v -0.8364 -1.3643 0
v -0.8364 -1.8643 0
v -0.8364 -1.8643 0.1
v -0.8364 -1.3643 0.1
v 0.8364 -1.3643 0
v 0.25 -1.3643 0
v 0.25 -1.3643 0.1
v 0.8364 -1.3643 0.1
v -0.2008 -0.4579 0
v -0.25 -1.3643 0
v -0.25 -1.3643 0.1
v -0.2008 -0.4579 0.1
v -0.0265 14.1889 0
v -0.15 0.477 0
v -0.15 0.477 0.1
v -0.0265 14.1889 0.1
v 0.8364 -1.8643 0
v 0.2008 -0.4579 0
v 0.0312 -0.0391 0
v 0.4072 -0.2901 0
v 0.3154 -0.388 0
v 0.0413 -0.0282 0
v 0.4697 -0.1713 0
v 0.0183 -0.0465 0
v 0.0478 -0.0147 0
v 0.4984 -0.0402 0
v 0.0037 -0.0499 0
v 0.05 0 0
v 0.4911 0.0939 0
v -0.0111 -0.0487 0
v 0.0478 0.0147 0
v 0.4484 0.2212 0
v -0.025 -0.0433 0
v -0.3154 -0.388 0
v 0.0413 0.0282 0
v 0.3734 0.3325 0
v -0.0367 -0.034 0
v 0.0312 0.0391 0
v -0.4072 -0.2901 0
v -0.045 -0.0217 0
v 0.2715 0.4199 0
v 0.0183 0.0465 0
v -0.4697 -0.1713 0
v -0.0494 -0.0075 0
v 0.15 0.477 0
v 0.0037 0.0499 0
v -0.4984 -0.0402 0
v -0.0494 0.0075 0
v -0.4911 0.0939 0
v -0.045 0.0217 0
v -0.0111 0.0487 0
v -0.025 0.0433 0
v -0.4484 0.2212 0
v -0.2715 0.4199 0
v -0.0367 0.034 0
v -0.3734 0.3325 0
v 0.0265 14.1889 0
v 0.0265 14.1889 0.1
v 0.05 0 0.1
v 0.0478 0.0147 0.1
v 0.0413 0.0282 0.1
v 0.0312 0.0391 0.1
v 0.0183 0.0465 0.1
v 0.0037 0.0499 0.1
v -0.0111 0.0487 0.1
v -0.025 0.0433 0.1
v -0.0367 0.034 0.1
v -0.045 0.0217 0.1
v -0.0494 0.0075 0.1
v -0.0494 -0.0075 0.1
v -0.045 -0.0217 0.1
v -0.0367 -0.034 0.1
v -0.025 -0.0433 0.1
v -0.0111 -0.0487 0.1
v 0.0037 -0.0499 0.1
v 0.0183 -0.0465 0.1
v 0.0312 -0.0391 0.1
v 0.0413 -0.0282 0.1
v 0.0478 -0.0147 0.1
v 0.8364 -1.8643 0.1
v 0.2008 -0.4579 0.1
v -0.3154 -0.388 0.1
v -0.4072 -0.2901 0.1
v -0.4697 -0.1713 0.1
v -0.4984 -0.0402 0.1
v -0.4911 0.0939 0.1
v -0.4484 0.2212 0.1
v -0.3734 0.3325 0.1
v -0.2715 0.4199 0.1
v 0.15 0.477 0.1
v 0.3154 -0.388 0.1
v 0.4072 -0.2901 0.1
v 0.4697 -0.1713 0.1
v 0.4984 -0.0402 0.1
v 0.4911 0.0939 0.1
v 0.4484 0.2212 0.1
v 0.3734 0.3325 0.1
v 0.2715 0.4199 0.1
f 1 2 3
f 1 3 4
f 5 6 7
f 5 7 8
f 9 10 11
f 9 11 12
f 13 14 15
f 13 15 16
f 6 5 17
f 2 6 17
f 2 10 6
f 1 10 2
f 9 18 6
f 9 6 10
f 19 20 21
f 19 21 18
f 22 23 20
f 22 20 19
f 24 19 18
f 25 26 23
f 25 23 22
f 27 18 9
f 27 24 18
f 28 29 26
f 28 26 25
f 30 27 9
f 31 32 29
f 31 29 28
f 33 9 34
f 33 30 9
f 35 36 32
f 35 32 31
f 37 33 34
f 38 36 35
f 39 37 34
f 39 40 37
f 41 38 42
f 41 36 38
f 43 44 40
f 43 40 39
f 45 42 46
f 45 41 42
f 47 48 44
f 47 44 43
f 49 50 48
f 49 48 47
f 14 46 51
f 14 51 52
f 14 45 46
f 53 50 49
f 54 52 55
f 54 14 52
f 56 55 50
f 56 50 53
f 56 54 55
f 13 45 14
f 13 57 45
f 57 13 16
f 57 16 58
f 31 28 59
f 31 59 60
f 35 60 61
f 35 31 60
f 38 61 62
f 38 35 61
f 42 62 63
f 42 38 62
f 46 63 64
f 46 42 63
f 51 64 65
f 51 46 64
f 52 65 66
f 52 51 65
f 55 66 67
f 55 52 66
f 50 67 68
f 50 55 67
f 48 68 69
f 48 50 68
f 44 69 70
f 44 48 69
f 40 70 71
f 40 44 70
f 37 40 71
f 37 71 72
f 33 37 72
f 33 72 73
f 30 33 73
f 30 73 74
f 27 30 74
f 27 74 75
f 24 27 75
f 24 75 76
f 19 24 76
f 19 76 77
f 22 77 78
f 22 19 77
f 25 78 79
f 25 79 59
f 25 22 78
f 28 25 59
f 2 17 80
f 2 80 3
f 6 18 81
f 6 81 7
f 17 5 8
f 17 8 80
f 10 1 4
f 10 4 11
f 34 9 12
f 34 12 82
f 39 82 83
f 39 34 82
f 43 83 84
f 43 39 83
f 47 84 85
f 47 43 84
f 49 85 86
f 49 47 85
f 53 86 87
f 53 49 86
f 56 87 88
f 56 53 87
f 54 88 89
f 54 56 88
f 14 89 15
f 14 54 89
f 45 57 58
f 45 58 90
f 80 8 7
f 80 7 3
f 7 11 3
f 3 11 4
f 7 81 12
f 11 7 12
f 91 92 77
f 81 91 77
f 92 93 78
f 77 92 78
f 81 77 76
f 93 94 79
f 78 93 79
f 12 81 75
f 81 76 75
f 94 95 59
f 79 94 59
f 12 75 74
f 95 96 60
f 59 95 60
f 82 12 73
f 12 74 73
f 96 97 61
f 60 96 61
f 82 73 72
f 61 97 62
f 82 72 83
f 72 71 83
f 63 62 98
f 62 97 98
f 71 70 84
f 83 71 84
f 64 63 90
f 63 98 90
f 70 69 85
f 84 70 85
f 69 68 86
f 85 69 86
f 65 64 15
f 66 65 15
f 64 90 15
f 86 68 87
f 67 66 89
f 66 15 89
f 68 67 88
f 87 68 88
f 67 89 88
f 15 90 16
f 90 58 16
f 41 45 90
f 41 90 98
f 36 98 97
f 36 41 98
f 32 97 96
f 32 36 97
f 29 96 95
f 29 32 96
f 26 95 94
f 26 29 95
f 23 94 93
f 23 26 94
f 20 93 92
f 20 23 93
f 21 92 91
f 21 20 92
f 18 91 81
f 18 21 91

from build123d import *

# Parameters (mm, degrees)
SKETCH1_R           = 0.05
BOSS_EXTRUDE1_DEPTH = 0.1


with BuildPart() as part:
    # Sketch1 → Boss-Extrude1 (new body)
    with BuildSketch(Plane.XY):
        with BuildLine():
            Line((0.200773833, -0.457919063), (0.25, -1.364310845))
            Line((0.25, -1.364310845), (0.836414697, -1.364310845))
            Line((0.836414697, -1.364310845), (0.836414697, -1.864310845))
            Line((0.836414697, -1.864310845), (-0.836414697, -1.864310845))
            Line((-0.836414697, -1.864310845), (-0.836414697, -1.364310845))
            Line((-0.836414697, -1.364310845), (-0.25, -1.364310845))
            Line((-0.25, -1.364310845), (-0.200773833, -0.457919063))
            ThreePointArc((-0.200773833, -0.457919063), (-0.499264232, 0.027115056), (-0.15, 0.476969601))
            Line((-0.15, 0.476969601), (-0.026526263, 14.188856359))
            Line((-0.026526263, 14.188856359), (0.026526263, 14.188856359))
            Line((0.026526263, 14.188856359), (0.15, 0.476969601))
            ThreePointArc((0.15, 0.476969601), (0.499264232, 0.027115056), (0.200773833, -0.457919063))
        make_face()
        Circle(SKETCH1_R, mode=Mode.SUBTRACT)
    extrude(amount=BOSS_EXTRUDE1_DEPTH)


solid = part.part
